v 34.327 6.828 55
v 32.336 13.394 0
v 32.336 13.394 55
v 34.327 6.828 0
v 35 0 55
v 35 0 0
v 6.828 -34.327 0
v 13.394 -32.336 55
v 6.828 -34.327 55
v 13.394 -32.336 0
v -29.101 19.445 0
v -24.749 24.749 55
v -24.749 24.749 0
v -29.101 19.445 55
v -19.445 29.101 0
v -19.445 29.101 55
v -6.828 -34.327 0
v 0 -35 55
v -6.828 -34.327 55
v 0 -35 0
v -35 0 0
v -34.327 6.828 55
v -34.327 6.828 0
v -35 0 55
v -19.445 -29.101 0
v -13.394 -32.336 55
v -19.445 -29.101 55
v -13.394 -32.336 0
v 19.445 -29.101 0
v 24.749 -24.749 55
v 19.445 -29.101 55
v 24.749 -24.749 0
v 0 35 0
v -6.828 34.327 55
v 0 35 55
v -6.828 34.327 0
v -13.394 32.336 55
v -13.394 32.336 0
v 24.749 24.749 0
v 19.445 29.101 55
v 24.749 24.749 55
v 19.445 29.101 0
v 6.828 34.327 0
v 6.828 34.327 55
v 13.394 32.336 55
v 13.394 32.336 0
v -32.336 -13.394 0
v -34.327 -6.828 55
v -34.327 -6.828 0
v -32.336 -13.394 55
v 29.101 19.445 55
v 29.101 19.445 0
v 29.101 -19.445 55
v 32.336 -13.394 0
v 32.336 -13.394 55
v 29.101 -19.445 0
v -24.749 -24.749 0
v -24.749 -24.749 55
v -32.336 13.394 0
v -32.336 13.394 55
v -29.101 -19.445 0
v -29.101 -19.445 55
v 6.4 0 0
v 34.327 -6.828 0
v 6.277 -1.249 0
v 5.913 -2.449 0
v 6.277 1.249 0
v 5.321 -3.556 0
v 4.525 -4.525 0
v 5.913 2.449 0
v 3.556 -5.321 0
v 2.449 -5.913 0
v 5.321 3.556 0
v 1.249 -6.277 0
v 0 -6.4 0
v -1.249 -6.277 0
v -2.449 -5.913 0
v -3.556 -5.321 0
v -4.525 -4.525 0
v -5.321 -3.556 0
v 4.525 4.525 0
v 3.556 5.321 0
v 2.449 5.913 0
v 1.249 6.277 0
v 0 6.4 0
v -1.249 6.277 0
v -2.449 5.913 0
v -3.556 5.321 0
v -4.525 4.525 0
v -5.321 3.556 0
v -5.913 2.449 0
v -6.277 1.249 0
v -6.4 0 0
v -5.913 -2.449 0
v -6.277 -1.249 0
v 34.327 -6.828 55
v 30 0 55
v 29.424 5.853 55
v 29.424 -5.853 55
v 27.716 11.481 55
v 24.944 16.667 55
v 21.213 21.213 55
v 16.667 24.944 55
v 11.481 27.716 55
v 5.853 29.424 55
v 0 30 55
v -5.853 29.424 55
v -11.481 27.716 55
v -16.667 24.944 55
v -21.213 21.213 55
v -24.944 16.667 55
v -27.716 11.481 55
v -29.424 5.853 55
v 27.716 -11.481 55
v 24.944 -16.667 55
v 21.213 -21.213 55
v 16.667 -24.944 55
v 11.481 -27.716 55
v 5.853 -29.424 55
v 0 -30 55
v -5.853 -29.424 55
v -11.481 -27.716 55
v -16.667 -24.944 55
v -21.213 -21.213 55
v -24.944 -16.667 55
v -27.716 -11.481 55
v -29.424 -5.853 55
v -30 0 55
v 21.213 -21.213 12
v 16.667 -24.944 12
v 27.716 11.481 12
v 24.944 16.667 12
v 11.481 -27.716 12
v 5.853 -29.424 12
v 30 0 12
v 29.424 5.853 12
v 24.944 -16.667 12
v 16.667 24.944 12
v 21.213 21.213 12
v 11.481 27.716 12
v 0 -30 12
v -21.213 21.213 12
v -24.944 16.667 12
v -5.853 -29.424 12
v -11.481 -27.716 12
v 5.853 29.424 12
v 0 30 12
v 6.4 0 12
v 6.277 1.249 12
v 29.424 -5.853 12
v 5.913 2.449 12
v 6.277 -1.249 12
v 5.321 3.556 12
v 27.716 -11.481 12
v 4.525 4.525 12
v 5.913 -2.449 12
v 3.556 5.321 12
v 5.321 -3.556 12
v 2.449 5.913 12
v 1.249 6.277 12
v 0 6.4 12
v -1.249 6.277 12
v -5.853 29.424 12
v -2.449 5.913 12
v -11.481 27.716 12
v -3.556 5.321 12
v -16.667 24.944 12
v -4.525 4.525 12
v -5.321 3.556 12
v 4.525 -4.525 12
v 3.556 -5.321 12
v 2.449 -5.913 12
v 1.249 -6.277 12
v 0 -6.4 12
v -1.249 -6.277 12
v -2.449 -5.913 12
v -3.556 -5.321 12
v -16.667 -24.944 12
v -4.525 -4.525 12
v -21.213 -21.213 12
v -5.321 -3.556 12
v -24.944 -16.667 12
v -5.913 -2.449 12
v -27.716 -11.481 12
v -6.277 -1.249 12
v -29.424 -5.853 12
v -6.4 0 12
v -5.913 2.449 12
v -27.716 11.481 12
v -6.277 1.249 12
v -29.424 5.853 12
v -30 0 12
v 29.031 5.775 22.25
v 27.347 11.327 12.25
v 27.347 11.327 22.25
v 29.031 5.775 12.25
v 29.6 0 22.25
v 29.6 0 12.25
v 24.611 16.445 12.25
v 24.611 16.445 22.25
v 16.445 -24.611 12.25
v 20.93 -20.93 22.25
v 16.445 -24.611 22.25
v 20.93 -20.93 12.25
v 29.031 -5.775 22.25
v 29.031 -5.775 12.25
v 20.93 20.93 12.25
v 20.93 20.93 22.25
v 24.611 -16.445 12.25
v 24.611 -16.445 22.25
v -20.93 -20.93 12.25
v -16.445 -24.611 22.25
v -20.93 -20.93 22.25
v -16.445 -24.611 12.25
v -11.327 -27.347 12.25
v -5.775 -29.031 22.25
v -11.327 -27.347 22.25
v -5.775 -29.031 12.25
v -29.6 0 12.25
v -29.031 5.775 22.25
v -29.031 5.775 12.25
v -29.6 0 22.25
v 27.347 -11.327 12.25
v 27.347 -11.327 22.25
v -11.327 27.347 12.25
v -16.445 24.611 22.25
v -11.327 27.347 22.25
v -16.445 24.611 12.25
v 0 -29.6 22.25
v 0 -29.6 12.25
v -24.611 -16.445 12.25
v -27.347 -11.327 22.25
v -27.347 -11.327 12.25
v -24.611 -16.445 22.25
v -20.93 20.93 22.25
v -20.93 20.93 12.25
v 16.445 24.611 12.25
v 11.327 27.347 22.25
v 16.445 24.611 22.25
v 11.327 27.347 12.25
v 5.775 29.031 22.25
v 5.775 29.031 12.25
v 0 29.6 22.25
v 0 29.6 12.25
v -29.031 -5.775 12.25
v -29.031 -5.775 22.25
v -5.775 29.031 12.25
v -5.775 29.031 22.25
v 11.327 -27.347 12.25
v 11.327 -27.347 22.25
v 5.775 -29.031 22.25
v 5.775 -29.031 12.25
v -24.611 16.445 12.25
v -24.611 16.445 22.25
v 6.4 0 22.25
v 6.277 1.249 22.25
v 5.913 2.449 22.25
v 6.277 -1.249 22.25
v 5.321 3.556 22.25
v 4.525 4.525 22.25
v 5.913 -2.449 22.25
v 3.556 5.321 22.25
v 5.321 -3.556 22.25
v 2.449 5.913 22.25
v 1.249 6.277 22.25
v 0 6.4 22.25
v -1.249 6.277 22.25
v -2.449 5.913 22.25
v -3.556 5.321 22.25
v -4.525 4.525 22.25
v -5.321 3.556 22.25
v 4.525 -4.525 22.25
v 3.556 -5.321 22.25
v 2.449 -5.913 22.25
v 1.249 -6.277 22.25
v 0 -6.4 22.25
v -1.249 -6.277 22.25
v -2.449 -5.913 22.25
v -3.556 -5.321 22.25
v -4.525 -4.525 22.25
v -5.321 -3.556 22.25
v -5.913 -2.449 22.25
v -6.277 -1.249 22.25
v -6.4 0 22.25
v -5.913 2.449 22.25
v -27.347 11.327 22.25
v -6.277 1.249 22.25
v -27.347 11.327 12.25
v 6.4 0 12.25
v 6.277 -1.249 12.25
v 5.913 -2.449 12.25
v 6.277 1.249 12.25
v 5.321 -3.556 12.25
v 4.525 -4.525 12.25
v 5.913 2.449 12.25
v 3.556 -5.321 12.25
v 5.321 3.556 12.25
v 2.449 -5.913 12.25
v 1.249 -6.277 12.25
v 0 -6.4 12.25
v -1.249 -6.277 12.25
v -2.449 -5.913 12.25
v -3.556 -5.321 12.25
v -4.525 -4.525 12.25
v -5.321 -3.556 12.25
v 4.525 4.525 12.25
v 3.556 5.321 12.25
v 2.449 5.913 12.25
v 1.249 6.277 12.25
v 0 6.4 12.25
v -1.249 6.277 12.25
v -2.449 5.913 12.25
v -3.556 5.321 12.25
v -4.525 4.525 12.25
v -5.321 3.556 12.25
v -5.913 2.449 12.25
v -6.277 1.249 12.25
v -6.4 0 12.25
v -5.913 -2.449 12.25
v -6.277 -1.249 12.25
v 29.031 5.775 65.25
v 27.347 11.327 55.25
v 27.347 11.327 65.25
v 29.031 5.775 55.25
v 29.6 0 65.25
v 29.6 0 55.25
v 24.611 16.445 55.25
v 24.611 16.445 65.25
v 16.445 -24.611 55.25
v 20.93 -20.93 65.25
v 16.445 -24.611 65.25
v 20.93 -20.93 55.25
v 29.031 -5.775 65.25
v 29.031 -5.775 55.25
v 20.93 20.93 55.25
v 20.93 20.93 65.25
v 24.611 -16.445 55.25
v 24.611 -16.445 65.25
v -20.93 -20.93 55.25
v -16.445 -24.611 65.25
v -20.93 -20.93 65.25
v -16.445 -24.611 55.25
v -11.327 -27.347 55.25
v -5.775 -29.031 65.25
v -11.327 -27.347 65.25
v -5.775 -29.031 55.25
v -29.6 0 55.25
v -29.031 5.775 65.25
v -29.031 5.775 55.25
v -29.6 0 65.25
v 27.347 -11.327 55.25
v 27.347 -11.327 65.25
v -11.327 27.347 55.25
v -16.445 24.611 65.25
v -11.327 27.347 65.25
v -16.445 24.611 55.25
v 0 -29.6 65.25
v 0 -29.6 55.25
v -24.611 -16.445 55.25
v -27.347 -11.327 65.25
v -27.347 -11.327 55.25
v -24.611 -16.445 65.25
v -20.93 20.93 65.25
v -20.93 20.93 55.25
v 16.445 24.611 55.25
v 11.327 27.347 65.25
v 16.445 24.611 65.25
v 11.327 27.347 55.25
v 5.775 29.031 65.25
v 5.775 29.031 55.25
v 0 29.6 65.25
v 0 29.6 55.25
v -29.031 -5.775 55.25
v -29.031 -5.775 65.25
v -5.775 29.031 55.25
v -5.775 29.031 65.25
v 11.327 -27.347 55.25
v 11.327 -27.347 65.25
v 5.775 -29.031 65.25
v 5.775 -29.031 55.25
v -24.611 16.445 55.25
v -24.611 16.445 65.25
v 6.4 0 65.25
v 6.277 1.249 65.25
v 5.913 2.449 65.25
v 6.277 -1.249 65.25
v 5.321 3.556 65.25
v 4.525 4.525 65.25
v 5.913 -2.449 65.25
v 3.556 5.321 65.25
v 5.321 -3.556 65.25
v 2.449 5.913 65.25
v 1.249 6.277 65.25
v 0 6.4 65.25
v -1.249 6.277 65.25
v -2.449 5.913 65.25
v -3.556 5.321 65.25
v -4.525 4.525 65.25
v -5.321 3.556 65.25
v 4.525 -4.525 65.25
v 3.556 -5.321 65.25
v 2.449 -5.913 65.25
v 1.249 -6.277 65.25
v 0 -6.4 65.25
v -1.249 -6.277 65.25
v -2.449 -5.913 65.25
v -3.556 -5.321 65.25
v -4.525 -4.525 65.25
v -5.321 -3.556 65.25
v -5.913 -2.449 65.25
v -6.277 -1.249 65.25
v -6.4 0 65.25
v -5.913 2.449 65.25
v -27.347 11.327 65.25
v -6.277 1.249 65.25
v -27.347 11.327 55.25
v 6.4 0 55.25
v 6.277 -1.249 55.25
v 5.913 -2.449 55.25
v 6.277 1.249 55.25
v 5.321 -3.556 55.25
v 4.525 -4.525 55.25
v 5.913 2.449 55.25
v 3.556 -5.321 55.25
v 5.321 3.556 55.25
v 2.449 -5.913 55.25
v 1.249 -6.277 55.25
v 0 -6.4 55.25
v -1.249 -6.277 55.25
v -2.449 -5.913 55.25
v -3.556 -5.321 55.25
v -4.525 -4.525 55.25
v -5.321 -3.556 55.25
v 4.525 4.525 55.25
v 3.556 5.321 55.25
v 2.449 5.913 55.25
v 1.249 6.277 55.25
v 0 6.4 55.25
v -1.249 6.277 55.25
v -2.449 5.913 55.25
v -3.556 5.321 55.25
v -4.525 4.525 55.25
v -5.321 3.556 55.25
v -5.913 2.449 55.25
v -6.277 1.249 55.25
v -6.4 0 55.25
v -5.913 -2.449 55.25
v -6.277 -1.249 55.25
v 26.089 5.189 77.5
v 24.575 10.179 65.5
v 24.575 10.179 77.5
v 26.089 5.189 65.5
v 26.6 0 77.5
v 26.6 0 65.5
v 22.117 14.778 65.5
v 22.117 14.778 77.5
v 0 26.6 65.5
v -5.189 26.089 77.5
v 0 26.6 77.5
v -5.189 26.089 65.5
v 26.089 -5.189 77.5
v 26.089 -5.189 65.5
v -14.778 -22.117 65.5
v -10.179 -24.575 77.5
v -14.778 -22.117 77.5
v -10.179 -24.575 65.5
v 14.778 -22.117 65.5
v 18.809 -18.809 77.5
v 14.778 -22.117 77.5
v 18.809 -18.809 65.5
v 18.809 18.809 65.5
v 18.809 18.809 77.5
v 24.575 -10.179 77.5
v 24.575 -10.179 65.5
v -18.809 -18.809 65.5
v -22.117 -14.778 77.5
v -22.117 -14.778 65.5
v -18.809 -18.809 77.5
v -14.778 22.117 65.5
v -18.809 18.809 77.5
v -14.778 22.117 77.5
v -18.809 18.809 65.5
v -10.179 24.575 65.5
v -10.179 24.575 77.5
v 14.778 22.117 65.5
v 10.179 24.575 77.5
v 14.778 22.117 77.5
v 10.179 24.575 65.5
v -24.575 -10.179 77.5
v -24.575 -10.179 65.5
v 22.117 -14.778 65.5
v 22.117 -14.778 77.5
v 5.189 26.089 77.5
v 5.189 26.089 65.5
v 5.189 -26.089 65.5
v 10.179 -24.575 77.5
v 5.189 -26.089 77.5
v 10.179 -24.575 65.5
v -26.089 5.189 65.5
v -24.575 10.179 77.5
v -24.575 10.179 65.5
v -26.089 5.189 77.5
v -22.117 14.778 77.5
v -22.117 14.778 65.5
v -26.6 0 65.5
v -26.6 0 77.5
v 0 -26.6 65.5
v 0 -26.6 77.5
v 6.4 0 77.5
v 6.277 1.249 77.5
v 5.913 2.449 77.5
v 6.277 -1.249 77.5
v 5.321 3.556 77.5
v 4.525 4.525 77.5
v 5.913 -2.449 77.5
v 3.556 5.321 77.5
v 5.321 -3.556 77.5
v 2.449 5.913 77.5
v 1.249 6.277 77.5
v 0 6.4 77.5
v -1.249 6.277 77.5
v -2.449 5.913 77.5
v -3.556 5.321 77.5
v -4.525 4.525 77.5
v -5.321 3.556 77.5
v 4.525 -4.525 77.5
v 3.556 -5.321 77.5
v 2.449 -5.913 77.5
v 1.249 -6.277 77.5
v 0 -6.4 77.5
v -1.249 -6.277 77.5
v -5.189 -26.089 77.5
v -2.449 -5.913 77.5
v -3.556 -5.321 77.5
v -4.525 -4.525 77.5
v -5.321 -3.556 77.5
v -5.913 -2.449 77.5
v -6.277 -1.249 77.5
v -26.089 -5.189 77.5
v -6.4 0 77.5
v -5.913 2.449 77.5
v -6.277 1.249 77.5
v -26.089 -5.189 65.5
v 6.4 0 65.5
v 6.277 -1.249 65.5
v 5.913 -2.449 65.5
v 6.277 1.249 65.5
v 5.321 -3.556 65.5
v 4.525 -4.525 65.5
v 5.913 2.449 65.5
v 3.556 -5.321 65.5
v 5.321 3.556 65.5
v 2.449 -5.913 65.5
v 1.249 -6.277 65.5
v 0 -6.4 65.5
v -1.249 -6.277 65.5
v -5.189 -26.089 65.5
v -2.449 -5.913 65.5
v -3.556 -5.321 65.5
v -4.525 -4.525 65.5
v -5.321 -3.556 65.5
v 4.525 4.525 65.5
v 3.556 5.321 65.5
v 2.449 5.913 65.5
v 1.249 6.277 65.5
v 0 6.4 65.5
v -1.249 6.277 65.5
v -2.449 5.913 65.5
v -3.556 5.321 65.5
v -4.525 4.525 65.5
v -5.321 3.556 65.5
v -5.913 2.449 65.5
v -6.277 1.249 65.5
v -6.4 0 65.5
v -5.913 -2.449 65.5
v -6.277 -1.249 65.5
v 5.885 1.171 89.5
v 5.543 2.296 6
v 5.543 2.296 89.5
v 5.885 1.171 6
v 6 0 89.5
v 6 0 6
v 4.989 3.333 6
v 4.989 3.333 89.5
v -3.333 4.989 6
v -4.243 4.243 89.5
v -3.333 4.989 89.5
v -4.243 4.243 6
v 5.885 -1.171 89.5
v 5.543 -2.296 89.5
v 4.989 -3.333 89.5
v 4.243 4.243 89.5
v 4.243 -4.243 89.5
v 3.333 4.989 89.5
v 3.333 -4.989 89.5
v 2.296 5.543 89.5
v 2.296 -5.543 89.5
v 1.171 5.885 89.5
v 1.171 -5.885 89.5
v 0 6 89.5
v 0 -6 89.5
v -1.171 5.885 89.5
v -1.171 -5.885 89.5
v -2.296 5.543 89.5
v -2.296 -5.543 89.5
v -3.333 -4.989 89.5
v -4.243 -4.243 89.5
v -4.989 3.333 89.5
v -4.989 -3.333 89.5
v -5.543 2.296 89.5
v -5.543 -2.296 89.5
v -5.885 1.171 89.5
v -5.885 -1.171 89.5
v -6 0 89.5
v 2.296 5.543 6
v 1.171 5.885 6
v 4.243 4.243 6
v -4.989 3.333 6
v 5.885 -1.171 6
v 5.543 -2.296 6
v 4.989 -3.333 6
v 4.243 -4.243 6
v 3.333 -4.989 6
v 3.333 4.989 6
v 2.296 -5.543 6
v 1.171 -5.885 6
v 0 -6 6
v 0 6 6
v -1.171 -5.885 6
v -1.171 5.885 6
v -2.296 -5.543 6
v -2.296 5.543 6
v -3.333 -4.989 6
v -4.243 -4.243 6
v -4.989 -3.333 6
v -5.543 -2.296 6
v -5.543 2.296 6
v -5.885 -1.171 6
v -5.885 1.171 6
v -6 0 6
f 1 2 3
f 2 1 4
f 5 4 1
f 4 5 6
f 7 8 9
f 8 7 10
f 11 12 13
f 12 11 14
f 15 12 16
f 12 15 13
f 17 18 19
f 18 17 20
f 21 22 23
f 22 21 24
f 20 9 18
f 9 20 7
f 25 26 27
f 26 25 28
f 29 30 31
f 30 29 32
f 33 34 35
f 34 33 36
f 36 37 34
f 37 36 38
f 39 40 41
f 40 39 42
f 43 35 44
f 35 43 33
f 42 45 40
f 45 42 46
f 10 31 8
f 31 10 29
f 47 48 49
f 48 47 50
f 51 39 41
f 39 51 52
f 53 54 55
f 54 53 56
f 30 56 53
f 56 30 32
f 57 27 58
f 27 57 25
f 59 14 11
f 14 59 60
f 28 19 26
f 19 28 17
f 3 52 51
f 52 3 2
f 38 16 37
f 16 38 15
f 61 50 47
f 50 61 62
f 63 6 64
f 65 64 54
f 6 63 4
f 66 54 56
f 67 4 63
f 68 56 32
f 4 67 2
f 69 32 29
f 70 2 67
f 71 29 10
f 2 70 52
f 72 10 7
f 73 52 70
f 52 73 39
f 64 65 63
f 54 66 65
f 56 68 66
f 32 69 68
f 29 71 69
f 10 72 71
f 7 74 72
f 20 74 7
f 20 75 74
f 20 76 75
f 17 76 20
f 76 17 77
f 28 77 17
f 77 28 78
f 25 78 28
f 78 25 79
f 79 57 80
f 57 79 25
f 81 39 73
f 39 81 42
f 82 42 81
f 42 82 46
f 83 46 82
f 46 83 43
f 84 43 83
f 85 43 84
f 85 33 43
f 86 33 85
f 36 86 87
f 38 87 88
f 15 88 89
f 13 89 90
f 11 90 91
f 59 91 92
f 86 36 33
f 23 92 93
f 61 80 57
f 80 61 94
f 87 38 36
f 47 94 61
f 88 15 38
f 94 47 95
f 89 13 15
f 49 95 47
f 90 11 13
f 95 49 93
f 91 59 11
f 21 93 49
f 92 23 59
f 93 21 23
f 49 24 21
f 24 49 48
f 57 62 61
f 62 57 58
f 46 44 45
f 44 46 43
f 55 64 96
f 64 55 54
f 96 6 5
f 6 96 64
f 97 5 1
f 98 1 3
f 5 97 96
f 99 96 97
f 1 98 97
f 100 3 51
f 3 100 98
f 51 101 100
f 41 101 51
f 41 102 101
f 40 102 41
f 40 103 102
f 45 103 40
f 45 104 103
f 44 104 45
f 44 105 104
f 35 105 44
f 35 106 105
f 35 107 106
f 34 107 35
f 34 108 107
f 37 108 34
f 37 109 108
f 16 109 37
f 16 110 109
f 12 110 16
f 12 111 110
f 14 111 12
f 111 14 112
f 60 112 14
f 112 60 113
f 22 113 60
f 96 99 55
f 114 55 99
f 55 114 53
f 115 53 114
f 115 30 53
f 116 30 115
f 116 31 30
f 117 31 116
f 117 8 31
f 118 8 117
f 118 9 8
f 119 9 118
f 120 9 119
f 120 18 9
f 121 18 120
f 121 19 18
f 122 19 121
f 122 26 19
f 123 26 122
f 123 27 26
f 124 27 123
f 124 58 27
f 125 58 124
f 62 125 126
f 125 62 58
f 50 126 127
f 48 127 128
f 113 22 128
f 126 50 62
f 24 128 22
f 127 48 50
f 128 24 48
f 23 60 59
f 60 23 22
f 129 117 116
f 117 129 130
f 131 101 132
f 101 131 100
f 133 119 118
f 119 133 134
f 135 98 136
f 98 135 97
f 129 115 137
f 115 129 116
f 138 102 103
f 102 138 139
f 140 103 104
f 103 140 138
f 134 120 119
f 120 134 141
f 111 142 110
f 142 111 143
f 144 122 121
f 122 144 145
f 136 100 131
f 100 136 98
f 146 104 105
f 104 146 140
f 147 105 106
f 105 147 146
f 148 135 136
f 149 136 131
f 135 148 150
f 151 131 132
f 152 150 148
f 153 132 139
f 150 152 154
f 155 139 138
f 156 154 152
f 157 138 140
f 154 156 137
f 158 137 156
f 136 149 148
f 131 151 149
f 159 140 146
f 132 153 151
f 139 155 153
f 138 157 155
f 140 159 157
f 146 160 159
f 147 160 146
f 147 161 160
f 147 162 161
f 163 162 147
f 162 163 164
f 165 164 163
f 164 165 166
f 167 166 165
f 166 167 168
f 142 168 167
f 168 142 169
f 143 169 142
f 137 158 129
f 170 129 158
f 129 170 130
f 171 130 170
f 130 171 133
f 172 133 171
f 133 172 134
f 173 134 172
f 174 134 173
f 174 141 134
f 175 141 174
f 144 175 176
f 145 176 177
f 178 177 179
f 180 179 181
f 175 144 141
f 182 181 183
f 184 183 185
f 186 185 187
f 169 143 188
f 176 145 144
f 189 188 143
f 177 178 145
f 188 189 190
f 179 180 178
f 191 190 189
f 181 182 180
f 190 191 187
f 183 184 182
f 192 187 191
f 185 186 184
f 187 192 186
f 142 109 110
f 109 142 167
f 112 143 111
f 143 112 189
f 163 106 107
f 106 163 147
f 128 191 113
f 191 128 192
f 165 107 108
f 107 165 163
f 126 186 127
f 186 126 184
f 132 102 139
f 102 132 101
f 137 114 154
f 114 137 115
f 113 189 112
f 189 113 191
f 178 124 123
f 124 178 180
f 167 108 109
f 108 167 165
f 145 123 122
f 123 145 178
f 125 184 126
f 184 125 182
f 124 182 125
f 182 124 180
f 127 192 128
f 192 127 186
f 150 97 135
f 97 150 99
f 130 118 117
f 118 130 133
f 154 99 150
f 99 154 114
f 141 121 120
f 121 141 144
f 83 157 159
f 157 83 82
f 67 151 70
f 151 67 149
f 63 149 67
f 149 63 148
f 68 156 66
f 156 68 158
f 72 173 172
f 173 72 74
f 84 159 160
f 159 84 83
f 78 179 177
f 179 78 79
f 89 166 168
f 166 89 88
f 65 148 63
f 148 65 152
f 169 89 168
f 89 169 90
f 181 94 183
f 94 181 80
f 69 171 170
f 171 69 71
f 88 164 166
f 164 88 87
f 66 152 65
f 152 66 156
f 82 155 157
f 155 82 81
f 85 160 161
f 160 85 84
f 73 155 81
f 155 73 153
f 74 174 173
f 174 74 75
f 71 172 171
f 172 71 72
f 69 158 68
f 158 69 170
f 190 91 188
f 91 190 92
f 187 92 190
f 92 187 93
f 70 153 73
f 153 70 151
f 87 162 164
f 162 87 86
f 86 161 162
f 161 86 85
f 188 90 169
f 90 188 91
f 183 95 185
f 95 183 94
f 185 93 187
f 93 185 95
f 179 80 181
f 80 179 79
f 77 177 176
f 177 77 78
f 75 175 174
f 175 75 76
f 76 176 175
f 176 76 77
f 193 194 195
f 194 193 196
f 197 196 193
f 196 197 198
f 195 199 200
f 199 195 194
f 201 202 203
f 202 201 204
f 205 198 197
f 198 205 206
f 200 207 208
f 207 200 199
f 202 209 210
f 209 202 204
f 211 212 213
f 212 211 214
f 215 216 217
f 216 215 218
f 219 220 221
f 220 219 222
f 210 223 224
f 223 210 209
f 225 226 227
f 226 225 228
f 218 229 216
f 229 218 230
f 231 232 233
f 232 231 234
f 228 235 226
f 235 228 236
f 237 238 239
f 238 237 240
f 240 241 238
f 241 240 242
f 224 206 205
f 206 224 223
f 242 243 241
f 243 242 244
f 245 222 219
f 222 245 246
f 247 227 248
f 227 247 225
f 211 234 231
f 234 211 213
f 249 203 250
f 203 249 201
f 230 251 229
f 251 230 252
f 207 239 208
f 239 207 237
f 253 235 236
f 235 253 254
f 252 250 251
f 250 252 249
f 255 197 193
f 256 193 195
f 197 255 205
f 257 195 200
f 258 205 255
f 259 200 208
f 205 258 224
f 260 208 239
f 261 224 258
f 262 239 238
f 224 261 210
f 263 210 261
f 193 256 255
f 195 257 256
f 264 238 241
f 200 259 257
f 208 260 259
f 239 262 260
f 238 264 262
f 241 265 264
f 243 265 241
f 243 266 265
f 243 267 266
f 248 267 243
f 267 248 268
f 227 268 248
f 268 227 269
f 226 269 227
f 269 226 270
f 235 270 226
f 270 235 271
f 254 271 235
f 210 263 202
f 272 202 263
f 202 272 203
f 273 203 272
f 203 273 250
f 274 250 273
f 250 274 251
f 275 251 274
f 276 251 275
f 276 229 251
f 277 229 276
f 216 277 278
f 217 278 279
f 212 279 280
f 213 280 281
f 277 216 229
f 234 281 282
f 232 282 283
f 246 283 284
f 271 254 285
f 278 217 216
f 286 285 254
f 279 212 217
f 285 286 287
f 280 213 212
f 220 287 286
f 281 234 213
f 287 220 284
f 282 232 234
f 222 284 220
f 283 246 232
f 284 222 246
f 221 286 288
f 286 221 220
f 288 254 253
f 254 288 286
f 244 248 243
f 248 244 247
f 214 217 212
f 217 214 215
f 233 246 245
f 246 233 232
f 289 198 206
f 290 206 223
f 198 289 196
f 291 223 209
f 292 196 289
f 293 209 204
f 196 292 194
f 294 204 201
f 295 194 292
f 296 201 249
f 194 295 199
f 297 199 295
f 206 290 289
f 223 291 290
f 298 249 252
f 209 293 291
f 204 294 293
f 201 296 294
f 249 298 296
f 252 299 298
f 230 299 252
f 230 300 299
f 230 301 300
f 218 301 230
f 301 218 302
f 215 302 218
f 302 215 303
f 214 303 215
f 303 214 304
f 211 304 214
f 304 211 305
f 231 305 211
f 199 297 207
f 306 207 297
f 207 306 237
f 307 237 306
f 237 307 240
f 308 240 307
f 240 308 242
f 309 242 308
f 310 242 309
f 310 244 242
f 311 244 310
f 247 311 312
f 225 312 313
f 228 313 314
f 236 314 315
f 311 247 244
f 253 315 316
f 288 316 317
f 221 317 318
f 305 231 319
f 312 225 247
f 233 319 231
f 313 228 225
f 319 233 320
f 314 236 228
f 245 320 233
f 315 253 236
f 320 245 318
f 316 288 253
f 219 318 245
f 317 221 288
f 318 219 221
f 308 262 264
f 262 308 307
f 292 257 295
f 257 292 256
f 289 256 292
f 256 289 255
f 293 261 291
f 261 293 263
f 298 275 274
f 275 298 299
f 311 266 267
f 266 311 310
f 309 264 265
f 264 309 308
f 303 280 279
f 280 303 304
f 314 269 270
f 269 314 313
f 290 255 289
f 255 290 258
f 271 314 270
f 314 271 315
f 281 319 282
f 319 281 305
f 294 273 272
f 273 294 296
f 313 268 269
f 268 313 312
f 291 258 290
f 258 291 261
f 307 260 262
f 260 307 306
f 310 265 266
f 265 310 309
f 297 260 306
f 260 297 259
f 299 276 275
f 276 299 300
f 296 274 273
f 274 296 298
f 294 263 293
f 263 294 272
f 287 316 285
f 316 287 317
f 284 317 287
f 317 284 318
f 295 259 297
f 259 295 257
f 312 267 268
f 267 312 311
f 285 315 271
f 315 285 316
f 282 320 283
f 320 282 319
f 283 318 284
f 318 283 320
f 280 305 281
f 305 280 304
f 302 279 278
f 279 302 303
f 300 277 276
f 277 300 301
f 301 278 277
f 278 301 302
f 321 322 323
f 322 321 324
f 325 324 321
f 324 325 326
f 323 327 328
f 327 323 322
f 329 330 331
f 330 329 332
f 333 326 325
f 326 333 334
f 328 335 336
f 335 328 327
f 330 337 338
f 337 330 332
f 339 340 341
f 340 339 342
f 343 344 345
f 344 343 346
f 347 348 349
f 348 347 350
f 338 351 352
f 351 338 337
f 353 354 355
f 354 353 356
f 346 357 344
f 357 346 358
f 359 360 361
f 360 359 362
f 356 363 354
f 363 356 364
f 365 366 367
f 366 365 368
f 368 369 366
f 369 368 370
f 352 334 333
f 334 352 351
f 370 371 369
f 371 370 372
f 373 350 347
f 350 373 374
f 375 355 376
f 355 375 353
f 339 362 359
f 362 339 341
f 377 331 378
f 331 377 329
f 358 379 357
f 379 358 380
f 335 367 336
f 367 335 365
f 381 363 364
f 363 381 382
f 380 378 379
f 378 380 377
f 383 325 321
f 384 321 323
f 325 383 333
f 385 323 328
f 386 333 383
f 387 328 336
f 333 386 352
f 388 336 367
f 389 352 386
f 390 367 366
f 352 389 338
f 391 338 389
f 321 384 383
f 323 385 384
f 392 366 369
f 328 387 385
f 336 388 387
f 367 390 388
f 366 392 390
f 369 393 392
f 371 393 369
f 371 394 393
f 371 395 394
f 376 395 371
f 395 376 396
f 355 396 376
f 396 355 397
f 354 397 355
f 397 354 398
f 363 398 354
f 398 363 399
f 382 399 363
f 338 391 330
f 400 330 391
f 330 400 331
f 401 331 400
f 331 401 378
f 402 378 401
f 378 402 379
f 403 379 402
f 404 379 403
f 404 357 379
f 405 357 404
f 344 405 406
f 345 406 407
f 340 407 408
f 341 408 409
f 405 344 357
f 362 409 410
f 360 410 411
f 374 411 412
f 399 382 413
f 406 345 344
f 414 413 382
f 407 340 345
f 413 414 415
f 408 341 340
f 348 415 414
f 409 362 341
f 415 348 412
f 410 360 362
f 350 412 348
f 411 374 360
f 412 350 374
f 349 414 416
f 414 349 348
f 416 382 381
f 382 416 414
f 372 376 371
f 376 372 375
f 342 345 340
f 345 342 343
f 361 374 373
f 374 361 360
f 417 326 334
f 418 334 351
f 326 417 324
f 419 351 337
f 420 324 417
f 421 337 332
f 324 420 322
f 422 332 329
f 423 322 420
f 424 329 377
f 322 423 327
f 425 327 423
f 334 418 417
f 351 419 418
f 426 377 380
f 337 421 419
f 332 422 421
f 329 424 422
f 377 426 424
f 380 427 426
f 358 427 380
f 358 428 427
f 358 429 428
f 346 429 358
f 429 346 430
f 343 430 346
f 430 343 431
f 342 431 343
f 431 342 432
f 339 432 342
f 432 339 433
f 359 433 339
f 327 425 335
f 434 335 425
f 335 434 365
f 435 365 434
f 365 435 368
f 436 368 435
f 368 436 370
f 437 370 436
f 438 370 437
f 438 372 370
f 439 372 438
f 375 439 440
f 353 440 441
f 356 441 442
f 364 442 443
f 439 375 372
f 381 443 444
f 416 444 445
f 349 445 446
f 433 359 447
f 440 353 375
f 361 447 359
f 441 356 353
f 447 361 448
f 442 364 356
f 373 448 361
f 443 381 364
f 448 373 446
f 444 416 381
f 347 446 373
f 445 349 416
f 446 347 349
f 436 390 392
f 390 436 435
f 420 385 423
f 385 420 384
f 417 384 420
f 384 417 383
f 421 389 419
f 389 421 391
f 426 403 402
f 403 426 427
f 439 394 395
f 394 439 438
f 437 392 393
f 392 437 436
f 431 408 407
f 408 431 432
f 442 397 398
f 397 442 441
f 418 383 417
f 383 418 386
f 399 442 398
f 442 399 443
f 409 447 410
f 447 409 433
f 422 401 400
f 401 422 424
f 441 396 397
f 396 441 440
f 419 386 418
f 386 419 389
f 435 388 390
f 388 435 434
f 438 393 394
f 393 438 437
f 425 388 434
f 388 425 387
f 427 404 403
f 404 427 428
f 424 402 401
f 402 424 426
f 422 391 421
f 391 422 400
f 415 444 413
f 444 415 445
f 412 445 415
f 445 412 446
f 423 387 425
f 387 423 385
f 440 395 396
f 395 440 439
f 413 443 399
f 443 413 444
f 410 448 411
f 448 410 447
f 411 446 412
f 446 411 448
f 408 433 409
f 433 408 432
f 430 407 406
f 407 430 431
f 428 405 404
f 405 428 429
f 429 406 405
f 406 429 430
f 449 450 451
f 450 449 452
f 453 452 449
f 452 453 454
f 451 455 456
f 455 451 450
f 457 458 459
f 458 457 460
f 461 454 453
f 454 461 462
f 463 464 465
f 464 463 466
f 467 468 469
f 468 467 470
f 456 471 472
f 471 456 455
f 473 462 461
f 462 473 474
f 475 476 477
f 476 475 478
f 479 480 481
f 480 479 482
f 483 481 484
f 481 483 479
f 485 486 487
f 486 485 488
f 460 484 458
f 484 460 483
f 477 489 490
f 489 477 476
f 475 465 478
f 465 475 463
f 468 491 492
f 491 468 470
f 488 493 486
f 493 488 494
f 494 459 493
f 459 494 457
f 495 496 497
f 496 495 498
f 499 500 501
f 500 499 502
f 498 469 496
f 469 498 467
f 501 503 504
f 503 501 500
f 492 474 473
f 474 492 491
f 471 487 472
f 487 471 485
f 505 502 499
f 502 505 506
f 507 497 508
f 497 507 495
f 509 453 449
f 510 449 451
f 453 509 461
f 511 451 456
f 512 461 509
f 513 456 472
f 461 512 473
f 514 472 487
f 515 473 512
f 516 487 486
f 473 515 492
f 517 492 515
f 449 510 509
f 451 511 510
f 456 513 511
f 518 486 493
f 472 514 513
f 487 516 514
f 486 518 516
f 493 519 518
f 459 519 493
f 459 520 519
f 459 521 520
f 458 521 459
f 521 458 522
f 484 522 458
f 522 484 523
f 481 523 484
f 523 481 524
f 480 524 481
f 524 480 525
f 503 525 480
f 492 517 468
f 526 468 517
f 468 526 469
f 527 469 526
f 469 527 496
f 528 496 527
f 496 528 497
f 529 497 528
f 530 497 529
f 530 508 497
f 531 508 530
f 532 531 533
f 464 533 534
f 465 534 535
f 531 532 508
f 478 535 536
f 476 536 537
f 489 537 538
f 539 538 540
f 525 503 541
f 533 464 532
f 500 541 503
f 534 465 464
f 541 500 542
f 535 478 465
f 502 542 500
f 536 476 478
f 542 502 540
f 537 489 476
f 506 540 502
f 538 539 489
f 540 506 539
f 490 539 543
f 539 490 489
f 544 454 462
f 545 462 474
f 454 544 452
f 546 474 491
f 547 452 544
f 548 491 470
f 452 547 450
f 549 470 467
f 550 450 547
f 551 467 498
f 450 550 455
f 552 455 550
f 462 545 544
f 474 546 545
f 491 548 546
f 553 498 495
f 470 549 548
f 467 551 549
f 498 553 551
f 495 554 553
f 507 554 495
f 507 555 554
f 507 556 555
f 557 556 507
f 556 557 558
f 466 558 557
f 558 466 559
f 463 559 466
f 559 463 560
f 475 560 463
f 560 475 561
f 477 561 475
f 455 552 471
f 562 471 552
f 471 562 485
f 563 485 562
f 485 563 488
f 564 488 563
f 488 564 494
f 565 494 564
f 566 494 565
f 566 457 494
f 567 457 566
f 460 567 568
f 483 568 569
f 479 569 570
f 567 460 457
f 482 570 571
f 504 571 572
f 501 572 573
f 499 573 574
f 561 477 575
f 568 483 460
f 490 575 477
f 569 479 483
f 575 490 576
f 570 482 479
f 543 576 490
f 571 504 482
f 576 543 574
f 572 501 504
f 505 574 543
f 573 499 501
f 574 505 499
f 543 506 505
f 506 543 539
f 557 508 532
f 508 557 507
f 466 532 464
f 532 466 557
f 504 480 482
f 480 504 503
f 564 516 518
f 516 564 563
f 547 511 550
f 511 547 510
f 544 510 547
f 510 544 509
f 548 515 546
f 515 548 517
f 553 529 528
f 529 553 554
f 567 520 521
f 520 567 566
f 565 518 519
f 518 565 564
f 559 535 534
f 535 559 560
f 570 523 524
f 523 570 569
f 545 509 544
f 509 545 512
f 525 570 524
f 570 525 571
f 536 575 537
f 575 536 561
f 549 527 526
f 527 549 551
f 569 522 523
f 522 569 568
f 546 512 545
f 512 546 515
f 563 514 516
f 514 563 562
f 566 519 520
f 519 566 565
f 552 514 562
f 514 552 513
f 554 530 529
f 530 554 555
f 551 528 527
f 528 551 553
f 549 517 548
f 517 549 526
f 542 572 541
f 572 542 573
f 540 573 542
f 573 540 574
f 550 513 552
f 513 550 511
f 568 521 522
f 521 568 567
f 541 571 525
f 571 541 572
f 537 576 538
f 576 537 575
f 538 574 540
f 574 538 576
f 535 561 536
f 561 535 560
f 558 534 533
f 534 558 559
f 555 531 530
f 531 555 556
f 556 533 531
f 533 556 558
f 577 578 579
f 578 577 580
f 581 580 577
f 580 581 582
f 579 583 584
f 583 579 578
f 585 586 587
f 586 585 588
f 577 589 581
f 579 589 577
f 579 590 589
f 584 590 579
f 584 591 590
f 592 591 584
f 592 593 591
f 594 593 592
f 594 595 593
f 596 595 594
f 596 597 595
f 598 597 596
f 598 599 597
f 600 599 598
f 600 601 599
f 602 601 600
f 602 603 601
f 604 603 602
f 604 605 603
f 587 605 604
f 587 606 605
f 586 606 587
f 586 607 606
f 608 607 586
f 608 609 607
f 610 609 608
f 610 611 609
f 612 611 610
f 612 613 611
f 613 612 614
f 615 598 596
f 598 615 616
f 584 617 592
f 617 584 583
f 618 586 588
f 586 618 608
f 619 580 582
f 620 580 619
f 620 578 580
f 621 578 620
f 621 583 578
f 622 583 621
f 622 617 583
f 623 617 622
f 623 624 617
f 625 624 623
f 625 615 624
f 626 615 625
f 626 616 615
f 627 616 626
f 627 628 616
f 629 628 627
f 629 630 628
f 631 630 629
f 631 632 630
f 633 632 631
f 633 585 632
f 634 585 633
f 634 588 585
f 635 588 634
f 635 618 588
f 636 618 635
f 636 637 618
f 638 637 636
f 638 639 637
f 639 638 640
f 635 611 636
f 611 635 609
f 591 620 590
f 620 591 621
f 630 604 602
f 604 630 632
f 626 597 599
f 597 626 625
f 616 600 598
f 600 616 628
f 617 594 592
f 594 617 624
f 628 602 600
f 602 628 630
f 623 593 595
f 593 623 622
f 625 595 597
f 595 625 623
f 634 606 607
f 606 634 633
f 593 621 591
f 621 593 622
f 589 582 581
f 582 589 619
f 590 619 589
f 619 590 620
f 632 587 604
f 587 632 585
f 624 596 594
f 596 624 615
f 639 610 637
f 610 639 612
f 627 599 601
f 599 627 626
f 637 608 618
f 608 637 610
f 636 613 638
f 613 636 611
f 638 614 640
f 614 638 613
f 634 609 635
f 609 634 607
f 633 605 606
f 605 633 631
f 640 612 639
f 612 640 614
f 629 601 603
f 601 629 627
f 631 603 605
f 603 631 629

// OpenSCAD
$fn = 32;

// ------------------------------------------------------------------------
// Bearing housing: housing d70, two bearings and a shaft
// Every part is its own module, assembly() places them once.
// ------------------------------------------------------------------------

// --- part 1 ---
module housing() {
  difference() {
    cylinder(h = 55, d = 70);
    translate([0, 0, 12]) cylinder(h = 44, d = 60);
    translate([0, 0, -1]) cylinder(h = 14, d = 12.8);
  }
}

// --- part 2 ---
module bearing_lower() {
  difference() {
      translate([0, 0, 0]) cylinder(h = 10, d = 59.2);
      translate([0, 0, -1]) cylinder(h = 12, d = 12.8);
    }
}

// --- part 3 ---
module bearing_upper() {
  difference() {
      translate([0, 0, 0]) cylinder(h = 10, d = 59.2);
      translate([0, 0, -1]) cylinder(h = 12, d = 12.8);
    }
}

// --- part 4 ---
module spacer() {
  difference() {
      translate([0, 0, 0]) cylinder(h = 12, d = 53.2);
      translate([0, 0, -1]) cylinder(h = 14, d = 12.8);
    }
}

// --- part 5 ---
module shaft() {
  translate([0, 0, -41.75]) cylinder(h = 83.5, d = 12);
}

// --- assembly ---
module assembly() {
  translate([0, 0, 0]) rotate([0, 0, 0]) housing();
  translate([0, 0, 12.25]) rotate([0, 0, 0]) bearing_lower();
  translate([0, 0, 55.25]) rotate([0, 0, 0]) bearing_upper();
  translate([0, 0, 65.5]) rotate([0, 0, 0]) spacer();
  translate([0, 0, 47.75]) rotate([0, 0, 0]) shaft();
}

assembly();
